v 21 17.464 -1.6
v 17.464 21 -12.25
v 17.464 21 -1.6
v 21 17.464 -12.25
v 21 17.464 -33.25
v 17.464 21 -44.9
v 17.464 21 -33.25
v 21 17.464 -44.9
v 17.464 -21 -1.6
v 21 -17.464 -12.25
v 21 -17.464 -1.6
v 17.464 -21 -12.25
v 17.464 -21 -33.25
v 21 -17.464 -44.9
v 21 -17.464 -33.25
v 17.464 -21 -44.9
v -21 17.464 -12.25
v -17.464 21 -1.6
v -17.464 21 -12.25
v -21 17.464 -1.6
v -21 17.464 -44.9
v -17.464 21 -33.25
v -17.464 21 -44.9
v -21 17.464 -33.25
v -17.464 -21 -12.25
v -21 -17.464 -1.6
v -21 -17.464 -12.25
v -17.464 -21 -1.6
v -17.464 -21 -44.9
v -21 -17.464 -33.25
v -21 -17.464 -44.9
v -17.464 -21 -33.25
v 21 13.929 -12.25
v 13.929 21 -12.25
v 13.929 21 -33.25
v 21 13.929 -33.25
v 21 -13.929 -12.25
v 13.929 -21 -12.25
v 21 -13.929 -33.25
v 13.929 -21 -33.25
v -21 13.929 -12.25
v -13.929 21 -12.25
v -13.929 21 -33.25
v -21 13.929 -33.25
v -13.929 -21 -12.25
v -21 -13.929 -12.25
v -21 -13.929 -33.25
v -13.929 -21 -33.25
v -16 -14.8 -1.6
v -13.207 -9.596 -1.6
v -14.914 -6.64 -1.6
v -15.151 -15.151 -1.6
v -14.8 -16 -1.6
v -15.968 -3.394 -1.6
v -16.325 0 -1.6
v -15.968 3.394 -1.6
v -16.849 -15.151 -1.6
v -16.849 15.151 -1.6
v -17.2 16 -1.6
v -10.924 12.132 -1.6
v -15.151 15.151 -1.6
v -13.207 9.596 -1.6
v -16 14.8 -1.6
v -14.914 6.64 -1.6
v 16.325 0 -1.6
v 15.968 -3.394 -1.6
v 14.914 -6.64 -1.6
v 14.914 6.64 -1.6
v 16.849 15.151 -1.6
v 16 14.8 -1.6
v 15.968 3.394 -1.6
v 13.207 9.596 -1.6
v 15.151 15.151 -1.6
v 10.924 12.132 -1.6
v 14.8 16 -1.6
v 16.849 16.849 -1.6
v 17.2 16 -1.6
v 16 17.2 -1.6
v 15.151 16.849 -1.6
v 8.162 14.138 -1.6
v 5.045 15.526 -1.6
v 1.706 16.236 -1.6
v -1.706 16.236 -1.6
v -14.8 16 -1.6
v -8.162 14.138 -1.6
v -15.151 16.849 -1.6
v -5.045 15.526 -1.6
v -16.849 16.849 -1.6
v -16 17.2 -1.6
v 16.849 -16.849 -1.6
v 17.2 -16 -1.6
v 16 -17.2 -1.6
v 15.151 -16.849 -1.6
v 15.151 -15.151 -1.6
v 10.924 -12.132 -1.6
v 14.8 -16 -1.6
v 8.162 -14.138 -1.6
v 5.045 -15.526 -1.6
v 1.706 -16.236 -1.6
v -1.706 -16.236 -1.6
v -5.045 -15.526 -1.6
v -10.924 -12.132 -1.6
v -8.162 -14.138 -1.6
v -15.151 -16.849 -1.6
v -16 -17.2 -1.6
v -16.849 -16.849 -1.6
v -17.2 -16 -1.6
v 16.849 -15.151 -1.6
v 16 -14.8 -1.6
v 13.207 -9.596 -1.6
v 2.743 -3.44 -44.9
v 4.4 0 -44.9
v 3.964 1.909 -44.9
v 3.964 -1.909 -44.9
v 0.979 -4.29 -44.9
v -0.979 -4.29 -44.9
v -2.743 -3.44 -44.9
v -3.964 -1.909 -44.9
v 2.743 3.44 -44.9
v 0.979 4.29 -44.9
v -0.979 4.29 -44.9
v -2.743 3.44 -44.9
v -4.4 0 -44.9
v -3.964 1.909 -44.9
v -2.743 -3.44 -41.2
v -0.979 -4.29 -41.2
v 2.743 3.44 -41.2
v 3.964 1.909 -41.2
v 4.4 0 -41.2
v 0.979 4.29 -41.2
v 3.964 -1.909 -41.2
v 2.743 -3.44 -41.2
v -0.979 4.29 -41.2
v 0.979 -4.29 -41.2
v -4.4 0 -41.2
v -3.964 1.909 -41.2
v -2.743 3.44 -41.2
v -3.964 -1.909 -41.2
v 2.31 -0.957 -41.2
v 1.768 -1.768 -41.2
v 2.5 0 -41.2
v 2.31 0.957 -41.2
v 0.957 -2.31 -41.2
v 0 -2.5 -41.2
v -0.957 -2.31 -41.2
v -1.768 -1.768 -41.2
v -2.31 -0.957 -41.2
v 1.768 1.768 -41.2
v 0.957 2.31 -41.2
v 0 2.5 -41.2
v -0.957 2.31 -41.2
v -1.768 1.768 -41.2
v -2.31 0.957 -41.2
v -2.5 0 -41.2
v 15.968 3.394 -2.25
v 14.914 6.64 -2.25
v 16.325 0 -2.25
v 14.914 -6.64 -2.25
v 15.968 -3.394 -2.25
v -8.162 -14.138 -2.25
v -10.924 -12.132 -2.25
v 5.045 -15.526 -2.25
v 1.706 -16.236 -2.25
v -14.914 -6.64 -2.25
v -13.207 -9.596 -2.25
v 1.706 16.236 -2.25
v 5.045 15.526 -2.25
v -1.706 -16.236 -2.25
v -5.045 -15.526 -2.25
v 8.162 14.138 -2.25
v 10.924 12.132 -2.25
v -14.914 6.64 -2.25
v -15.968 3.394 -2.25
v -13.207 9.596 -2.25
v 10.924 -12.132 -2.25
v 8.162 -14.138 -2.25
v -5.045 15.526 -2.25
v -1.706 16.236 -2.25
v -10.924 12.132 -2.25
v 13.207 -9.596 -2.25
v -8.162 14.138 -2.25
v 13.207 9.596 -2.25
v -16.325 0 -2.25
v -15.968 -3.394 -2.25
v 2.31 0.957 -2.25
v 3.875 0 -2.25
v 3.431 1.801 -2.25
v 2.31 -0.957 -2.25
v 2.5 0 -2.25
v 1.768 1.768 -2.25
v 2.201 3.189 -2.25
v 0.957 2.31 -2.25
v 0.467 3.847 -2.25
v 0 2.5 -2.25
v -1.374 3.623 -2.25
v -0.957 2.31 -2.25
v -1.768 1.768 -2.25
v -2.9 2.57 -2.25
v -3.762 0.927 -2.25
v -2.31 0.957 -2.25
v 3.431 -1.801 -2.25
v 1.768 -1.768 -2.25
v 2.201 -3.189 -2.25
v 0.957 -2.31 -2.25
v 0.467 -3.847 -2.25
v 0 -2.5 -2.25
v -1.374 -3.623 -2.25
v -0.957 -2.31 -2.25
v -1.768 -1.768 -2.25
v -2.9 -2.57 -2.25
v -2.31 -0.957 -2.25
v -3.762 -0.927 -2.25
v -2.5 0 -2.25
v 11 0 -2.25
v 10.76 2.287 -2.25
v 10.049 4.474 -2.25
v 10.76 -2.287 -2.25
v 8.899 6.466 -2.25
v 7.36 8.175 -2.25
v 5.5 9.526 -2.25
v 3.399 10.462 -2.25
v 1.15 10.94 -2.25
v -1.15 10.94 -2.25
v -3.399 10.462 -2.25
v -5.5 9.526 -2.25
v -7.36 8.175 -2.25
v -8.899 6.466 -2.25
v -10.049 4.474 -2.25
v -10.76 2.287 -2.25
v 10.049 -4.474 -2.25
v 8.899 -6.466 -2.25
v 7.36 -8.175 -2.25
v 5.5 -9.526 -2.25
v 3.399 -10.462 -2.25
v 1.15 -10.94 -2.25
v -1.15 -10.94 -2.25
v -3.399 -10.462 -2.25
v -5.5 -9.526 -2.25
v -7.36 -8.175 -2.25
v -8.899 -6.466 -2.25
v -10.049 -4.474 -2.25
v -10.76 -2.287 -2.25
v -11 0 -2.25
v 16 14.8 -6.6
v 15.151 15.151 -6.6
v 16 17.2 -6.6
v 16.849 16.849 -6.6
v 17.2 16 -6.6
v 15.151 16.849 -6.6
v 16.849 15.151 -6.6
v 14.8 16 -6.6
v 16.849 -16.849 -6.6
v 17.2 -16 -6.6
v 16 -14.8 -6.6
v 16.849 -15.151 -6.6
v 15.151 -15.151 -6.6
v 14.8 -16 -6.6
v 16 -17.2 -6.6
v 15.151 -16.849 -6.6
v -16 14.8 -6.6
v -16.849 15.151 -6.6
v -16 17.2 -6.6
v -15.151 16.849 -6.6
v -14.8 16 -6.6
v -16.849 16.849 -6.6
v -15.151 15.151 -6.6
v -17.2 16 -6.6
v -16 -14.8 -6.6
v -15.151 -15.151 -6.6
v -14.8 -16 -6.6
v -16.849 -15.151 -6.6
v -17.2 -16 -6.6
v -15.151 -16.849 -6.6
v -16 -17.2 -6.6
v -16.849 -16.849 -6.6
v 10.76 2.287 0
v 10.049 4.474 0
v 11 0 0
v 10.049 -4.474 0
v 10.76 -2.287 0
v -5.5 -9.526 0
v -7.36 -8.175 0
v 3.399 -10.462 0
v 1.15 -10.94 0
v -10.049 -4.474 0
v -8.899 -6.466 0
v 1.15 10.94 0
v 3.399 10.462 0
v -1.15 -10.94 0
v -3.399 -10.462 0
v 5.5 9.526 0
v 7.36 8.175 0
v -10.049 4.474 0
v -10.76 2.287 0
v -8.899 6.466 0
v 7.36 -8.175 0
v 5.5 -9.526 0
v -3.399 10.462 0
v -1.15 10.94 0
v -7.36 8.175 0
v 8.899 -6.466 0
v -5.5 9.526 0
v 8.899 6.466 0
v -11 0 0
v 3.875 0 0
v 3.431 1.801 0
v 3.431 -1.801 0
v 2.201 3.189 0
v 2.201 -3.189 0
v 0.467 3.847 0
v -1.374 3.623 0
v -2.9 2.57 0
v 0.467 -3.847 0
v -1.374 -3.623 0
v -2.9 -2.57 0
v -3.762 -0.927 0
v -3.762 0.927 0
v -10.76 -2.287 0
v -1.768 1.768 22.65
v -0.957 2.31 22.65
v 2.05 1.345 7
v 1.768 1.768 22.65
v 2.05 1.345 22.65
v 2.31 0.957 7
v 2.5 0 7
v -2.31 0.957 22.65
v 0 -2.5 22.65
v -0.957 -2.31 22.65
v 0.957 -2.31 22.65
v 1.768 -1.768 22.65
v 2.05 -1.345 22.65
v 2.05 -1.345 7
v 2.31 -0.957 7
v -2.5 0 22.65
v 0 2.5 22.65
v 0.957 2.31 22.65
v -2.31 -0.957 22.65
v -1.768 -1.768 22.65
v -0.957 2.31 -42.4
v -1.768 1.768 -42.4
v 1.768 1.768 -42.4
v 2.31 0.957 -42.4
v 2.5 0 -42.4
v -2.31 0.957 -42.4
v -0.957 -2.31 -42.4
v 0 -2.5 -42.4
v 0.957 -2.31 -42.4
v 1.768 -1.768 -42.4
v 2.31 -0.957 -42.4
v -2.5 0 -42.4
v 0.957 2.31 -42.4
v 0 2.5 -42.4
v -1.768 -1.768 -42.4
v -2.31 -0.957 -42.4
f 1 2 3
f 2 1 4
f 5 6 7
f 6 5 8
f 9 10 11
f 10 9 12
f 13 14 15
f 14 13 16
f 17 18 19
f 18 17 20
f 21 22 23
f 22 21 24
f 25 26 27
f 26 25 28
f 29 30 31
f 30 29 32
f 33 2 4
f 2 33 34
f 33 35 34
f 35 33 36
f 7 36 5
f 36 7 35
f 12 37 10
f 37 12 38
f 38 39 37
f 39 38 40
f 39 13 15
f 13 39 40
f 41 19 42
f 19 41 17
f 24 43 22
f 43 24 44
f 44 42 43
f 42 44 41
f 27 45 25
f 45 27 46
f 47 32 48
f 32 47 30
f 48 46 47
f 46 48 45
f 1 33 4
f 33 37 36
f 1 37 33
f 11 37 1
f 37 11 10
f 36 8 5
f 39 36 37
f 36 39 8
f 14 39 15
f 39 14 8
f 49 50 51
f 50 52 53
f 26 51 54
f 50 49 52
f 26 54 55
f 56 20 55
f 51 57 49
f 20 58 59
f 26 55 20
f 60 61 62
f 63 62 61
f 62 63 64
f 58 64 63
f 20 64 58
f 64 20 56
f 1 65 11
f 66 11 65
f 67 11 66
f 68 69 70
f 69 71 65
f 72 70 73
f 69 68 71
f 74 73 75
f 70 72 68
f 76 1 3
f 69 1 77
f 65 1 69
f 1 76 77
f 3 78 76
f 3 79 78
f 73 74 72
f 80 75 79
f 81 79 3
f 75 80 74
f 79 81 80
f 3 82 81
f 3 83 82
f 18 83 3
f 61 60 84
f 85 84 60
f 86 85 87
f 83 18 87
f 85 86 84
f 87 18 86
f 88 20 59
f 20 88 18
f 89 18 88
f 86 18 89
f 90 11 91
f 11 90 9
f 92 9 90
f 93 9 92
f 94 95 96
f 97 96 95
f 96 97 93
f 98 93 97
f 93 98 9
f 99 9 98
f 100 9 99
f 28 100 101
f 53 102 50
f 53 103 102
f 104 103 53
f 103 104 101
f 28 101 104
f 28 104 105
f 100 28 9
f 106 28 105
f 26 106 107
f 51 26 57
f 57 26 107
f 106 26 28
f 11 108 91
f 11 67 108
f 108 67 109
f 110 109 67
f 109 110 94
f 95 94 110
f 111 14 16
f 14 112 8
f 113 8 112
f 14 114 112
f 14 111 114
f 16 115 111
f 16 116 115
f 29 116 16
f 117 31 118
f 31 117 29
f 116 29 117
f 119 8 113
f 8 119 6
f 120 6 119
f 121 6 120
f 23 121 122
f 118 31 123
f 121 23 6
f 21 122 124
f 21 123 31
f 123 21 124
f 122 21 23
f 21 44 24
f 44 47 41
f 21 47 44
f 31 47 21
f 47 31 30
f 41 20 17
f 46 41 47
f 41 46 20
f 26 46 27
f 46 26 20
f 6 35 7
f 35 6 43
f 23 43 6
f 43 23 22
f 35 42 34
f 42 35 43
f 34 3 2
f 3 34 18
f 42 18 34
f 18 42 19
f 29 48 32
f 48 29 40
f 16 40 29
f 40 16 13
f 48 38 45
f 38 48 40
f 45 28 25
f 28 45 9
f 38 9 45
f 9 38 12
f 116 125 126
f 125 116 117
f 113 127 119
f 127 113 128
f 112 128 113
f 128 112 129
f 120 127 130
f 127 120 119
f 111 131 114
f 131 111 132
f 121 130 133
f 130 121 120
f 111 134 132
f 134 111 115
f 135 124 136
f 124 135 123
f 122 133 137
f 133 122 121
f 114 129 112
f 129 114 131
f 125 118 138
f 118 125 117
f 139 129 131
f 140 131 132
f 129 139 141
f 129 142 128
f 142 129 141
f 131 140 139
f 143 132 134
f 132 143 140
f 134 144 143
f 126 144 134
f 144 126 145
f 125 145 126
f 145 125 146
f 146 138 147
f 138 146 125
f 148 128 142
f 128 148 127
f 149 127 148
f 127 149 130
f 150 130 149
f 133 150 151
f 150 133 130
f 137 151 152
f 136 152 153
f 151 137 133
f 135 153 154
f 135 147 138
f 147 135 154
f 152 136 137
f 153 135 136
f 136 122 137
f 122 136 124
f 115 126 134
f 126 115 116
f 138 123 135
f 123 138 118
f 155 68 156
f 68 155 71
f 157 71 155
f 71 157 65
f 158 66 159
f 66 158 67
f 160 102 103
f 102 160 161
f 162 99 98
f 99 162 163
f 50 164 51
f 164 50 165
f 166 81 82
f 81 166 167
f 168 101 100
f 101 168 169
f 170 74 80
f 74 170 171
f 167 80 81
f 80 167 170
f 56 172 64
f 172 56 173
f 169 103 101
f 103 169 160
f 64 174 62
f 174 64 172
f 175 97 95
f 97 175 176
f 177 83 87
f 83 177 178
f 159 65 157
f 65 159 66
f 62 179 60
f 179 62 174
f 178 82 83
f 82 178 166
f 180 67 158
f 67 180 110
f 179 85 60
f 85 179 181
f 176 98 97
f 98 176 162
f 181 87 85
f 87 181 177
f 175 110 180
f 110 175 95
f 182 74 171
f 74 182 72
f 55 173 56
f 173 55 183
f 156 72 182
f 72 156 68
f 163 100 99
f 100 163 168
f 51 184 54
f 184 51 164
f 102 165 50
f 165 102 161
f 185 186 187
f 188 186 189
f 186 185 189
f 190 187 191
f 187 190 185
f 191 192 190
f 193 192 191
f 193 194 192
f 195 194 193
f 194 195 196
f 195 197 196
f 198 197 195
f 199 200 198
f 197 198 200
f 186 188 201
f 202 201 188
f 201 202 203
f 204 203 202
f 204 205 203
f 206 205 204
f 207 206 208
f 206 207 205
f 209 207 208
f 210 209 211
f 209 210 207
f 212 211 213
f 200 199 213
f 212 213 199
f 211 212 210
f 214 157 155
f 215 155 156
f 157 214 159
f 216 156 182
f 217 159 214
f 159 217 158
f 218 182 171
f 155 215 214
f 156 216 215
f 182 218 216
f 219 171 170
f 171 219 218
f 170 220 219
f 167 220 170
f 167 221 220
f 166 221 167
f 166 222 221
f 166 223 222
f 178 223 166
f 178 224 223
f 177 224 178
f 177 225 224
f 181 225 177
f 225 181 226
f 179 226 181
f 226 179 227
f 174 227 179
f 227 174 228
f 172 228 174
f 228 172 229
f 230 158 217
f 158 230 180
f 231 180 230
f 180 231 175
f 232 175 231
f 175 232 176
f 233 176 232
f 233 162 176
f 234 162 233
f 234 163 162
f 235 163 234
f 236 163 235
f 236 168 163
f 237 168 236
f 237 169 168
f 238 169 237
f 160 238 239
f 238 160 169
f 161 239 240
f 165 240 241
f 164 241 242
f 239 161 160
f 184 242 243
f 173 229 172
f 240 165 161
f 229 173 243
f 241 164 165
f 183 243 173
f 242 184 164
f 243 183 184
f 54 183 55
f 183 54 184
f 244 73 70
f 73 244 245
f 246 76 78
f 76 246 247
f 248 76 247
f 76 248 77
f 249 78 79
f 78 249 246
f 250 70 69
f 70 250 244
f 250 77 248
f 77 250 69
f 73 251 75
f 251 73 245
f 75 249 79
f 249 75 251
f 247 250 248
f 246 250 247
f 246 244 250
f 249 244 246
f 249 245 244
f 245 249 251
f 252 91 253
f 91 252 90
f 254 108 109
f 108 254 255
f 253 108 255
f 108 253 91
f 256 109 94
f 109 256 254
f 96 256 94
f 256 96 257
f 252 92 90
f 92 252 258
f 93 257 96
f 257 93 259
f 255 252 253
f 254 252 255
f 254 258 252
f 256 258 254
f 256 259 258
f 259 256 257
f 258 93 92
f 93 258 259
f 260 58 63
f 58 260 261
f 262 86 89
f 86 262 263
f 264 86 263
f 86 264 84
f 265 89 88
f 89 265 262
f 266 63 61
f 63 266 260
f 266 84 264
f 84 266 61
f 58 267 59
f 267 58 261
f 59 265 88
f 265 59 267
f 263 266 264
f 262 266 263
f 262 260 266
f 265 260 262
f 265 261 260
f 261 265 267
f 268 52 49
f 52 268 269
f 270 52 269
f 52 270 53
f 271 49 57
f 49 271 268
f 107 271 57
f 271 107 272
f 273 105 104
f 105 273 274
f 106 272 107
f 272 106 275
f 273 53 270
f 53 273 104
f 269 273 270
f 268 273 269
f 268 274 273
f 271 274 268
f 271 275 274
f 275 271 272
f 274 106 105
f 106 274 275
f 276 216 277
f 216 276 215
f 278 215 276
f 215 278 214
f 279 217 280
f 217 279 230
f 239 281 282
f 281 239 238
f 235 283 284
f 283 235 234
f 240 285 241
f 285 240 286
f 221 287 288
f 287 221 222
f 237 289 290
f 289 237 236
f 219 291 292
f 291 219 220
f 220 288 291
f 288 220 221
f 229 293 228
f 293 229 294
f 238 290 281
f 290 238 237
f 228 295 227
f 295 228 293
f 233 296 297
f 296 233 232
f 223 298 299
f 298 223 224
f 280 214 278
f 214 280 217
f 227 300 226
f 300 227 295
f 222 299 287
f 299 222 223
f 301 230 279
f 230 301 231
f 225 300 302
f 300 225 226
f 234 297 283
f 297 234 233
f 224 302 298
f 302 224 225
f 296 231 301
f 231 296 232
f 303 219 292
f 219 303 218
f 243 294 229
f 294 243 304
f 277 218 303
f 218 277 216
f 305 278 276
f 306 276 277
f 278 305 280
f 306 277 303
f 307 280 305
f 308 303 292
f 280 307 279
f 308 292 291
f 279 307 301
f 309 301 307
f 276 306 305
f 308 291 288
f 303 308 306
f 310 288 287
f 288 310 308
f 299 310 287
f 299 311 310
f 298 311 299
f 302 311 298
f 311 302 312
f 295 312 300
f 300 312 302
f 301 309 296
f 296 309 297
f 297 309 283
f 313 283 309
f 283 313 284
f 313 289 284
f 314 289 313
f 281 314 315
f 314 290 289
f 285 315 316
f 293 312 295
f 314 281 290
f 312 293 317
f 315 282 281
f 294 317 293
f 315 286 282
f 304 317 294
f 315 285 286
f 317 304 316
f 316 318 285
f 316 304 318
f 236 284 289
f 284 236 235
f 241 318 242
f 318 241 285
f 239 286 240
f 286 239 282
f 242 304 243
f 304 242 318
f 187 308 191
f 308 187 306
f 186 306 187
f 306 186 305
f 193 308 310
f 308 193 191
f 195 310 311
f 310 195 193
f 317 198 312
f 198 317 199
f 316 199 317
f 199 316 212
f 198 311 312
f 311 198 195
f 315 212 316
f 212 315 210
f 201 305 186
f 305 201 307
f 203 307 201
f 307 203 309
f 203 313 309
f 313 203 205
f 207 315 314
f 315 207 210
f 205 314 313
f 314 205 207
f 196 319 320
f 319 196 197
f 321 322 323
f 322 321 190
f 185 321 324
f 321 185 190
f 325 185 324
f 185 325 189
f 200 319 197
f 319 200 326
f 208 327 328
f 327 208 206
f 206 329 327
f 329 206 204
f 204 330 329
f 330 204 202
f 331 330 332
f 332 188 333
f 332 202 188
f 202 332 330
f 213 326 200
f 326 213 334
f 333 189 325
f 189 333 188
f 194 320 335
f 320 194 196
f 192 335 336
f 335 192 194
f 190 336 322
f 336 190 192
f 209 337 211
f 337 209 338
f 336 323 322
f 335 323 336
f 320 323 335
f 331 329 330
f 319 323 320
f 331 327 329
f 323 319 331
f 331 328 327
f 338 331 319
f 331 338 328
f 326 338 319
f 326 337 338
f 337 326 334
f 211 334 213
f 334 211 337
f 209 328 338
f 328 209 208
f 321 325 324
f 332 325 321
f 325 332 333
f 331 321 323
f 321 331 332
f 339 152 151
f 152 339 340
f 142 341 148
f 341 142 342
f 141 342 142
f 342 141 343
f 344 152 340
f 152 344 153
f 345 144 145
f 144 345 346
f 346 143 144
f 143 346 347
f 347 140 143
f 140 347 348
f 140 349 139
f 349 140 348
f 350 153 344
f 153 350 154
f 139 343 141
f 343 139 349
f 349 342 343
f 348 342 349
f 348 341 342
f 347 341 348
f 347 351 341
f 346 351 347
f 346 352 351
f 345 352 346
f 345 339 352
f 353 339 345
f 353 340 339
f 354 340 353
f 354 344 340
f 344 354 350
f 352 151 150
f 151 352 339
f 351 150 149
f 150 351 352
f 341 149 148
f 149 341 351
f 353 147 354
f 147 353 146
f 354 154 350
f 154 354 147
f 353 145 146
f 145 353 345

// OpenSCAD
//kt  Nema 17 motor model

Nema17();

module Nema17(height = 43.3) {
  
  size = 42;   
  bevel1 = 5;
  bevel2 = 10;
  RecessDepth = 0.65;
  CenterRaisedZ = 2.25;
  ShaftCutoutDepth = 5;
  ShaftDiameter = 5;
  ShaftDiamFlat = 4.55;
  ShaftDiamDiff = ShaftDiameter-ShaftDiamFlat;
  ShaftLen = 22; //amount outside motor
  UnflattenedLen = 7;
  FlatLen = ShaftLen-UnflattenedLen+1;
      
  translate([0,0,-height/2+RecessDepth-CenterRaisedZ])
  union() {
    color("Gray")
    difference() {
      cube([size, size, height], center=true); //main block for motor
      union() {  //cut away corner bevels
        translate([size/2, size/2,0])
          rotate([0, 0, 45])
            cube([bevel1, bevel1, height+3], center=true);
        translate([size/2, -size/2,0])
          rotate([0, 0, 45])
            cube([bevel1, bevel1, height+3], center=true);
        translate([-size/2, size/2,0])
          rotate([0, 0, 45])
            cube([bevel1, bevel1, height+3], center=true);
        translate([-size/2, -size/2,0])
          rotate([0, 0, 45])
            cube([bevel1, bevel1, height+3], center=true);
      }  
      union() { //cut away corners of main body
         TopSolid = 10.65;
         BottomSolid = 11.65;
         Diff = abs(BottomSolid-TopSolid);
       
         translate([size/2, size/2, Diff/2])
          rotate([0, 0, 45])
            cube([bevel2, bevel2, height-TopSolid-BottomSolid], center=true);
         translate([size/2, -size/2, Diff/2])
          rotate([0, 0, 45])
            cube([bevel2, bevel2, height-TopSolid-BottomSolid], center=true);
         translate([-size/2, size/2, Diff/2])
          rotate([0, 0, 45])
            cube([bevel2, bevel2, height-TopSolid-BottomSolid], center=true);
         translate([-size/2, -size/2, Diff/2])
          rotate([0, 0, 45])
            cube([bevel2, bevel2, height-TopSolid-BottomSolid], center=true);
      }
      translate([0,0, -height/2-10+3.7])  //cutaway bottom shaft hole
        cylinder(r=8.8/2, h=10);
      translate([0,0,height/2-RecessDepth])  //cutaway top recess
        cylinder(r=32.65/2, h=1);
      translate([size/2-5, size/2-5, height/2-5], $fs=1) //cut away screw hole
        cylinder(r=2.4/2, h=5+1);
      translate([size/2-5, -size/2+5, height/2-5], $fs=1) //cut away screw hole
        cylinder(r=2.4/2, h=5+1);
      translate([-size/2+5, size/2-5, height/2-5], $fs=1) //cut away screw hole
        cylinder(r=2.4/2, h=5+1);
      translate([-size/2+5, -size/2+5, height/2-5], $fs=1) //cut away screw hole
        cylinder(r=2.4/2, h=5+1);
    }
    color("black")
    difference() { //top raised circle, with central shaft hole
      ShaftCutoutDepth = 5;
      translate([0,0,height/2-RecessDepth])
        cylinder(r=22/2, h=CenterRaisedZ);
      translate([0,0, height/2-RecessDepth+CenterRaisedZ-ShaftCutoutDepth+0.1])
        cylinder(r=7.75/2, h=ShaftCutoutDepth);
    }  
    difference() {  //drive shaft
      color("LightGray")
      translate([0, 0, height/2-RecessDepth])
        cylinder(r=ShaftDiameter/2, h=ShaftLen+RecessDepth+CenterRaisedZ, $fs=1);
      translate([ShaftDiameter- ShaftDiamDiff,0, height/2-RecessDepth+CenterRaisedZ+UnflattenedLen + FlatLen/2])
        cube([ShaftDiameter, ShaftDiameter, FlatLen], center=true);
    }  
    color("LightGray")
      translate([0, 0, -height/2+2.5])
        cylinder(r=ShaftDiameter/2, h=2, $fs=1);
    
  }  
}  
